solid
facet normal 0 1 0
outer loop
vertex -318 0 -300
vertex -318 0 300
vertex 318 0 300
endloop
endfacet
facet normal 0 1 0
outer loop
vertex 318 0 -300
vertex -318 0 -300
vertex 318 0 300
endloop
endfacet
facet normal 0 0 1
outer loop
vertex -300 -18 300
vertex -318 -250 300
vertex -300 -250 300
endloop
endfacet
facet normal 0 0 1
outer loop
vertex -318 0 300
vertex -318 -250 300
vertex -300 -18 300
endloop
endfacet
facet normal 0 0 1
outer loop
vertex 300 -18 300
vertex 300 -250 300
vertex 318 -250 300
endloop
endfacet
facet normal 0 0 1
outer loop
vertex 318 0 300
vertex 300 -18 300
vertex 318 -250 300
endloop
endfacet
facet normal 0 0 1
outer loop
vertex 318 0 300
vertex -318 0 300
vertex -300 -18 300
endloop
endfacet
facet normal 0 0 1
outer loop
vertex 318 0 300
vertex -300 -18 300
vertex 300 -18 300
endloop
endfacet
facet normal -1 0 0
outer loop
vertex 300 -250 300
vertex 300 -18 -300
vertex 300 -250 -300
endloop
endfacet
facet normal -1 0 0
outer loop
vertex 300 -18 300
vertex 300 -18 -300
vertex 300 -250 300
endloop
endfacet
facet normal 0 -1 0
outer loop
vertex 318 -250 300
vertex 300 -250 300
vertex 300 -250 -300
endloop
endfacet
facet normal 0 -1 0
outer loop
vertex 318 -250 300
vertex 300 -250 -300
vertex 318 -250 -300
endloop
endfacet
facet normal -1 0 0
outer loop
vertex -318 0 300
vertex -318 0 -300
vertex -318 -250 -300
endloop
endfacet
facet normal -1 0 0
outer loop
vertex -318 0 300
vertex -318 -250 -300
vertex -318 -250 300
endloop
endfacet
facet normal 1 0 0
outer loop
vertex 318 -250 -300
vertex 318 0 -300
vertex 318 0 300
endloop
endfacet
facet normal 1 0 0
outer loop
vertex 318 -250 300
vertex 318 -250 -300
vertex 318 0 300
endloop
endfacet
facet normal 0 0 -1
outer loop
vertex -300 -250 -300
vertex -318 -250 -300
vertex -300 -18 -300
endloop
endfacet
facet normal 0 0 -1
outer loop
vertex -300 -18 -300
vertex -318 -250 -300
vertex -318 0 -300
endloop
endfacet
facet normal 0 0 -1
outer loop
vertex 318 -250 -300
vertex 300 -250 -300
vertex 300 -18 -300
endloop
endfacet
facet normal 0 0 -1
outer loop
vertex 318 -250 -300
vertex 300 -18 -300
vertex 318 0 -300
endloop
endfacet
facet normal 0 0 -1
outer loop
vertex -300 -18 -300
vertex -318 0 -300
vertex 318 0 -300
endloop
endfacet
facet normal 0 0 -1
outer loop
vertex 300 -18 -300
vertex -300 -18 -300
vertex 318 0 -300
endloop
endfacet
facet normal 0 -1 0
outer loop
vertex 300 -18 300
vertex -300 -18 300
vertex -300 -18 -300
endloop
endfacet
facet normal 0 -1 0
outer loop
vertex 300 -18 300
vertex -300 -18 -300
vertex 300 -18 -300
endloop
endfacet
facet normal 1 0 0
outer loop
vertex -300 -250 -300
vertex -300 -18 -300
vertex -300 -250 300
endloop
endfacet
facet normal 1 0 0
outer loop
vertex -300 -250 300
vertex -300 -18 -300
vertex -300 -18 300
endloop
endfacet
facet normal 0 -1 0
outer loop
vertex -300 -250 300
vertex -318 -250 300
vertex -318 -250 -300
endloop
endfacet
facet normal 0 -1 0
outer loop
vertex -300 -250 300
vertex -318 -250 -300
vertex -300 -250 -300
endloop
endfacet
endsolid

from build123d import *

# Parameters (mm, degrees)
F0_W     = 600
F0_H     = 600
F1_DEPTH = 18
F2_W     = 18
F2_H     = 600
F3_DEPTH = 250
F4_W     = 18
F4_H     = 600
F5_DEPTH = 250


with BuildPart() as f1:
    # F0 (on Front) → F1 (new body)
    with BuildSketch(Plane.XZ):
        Rectangle(F0_W, F0_H)
    extrude(amount=F1_DEPTH)

    # F2 (on Front) → F3 (join)
    with BuildSketch(Plane.XZ):
        with Locations((-309, 0)):
            Rectangle(F2_W, F2_H)
    extrude(amount=F3_DEPTH)

    # F4 (on Front) → F5 (join)
    with BuildSketch(Plane.XZ):
        with Locations((309, 0)):
            Rectangle(F4_W, F4_H)
    extrude(amount=F5_DEPTH)


solid = f1.part
